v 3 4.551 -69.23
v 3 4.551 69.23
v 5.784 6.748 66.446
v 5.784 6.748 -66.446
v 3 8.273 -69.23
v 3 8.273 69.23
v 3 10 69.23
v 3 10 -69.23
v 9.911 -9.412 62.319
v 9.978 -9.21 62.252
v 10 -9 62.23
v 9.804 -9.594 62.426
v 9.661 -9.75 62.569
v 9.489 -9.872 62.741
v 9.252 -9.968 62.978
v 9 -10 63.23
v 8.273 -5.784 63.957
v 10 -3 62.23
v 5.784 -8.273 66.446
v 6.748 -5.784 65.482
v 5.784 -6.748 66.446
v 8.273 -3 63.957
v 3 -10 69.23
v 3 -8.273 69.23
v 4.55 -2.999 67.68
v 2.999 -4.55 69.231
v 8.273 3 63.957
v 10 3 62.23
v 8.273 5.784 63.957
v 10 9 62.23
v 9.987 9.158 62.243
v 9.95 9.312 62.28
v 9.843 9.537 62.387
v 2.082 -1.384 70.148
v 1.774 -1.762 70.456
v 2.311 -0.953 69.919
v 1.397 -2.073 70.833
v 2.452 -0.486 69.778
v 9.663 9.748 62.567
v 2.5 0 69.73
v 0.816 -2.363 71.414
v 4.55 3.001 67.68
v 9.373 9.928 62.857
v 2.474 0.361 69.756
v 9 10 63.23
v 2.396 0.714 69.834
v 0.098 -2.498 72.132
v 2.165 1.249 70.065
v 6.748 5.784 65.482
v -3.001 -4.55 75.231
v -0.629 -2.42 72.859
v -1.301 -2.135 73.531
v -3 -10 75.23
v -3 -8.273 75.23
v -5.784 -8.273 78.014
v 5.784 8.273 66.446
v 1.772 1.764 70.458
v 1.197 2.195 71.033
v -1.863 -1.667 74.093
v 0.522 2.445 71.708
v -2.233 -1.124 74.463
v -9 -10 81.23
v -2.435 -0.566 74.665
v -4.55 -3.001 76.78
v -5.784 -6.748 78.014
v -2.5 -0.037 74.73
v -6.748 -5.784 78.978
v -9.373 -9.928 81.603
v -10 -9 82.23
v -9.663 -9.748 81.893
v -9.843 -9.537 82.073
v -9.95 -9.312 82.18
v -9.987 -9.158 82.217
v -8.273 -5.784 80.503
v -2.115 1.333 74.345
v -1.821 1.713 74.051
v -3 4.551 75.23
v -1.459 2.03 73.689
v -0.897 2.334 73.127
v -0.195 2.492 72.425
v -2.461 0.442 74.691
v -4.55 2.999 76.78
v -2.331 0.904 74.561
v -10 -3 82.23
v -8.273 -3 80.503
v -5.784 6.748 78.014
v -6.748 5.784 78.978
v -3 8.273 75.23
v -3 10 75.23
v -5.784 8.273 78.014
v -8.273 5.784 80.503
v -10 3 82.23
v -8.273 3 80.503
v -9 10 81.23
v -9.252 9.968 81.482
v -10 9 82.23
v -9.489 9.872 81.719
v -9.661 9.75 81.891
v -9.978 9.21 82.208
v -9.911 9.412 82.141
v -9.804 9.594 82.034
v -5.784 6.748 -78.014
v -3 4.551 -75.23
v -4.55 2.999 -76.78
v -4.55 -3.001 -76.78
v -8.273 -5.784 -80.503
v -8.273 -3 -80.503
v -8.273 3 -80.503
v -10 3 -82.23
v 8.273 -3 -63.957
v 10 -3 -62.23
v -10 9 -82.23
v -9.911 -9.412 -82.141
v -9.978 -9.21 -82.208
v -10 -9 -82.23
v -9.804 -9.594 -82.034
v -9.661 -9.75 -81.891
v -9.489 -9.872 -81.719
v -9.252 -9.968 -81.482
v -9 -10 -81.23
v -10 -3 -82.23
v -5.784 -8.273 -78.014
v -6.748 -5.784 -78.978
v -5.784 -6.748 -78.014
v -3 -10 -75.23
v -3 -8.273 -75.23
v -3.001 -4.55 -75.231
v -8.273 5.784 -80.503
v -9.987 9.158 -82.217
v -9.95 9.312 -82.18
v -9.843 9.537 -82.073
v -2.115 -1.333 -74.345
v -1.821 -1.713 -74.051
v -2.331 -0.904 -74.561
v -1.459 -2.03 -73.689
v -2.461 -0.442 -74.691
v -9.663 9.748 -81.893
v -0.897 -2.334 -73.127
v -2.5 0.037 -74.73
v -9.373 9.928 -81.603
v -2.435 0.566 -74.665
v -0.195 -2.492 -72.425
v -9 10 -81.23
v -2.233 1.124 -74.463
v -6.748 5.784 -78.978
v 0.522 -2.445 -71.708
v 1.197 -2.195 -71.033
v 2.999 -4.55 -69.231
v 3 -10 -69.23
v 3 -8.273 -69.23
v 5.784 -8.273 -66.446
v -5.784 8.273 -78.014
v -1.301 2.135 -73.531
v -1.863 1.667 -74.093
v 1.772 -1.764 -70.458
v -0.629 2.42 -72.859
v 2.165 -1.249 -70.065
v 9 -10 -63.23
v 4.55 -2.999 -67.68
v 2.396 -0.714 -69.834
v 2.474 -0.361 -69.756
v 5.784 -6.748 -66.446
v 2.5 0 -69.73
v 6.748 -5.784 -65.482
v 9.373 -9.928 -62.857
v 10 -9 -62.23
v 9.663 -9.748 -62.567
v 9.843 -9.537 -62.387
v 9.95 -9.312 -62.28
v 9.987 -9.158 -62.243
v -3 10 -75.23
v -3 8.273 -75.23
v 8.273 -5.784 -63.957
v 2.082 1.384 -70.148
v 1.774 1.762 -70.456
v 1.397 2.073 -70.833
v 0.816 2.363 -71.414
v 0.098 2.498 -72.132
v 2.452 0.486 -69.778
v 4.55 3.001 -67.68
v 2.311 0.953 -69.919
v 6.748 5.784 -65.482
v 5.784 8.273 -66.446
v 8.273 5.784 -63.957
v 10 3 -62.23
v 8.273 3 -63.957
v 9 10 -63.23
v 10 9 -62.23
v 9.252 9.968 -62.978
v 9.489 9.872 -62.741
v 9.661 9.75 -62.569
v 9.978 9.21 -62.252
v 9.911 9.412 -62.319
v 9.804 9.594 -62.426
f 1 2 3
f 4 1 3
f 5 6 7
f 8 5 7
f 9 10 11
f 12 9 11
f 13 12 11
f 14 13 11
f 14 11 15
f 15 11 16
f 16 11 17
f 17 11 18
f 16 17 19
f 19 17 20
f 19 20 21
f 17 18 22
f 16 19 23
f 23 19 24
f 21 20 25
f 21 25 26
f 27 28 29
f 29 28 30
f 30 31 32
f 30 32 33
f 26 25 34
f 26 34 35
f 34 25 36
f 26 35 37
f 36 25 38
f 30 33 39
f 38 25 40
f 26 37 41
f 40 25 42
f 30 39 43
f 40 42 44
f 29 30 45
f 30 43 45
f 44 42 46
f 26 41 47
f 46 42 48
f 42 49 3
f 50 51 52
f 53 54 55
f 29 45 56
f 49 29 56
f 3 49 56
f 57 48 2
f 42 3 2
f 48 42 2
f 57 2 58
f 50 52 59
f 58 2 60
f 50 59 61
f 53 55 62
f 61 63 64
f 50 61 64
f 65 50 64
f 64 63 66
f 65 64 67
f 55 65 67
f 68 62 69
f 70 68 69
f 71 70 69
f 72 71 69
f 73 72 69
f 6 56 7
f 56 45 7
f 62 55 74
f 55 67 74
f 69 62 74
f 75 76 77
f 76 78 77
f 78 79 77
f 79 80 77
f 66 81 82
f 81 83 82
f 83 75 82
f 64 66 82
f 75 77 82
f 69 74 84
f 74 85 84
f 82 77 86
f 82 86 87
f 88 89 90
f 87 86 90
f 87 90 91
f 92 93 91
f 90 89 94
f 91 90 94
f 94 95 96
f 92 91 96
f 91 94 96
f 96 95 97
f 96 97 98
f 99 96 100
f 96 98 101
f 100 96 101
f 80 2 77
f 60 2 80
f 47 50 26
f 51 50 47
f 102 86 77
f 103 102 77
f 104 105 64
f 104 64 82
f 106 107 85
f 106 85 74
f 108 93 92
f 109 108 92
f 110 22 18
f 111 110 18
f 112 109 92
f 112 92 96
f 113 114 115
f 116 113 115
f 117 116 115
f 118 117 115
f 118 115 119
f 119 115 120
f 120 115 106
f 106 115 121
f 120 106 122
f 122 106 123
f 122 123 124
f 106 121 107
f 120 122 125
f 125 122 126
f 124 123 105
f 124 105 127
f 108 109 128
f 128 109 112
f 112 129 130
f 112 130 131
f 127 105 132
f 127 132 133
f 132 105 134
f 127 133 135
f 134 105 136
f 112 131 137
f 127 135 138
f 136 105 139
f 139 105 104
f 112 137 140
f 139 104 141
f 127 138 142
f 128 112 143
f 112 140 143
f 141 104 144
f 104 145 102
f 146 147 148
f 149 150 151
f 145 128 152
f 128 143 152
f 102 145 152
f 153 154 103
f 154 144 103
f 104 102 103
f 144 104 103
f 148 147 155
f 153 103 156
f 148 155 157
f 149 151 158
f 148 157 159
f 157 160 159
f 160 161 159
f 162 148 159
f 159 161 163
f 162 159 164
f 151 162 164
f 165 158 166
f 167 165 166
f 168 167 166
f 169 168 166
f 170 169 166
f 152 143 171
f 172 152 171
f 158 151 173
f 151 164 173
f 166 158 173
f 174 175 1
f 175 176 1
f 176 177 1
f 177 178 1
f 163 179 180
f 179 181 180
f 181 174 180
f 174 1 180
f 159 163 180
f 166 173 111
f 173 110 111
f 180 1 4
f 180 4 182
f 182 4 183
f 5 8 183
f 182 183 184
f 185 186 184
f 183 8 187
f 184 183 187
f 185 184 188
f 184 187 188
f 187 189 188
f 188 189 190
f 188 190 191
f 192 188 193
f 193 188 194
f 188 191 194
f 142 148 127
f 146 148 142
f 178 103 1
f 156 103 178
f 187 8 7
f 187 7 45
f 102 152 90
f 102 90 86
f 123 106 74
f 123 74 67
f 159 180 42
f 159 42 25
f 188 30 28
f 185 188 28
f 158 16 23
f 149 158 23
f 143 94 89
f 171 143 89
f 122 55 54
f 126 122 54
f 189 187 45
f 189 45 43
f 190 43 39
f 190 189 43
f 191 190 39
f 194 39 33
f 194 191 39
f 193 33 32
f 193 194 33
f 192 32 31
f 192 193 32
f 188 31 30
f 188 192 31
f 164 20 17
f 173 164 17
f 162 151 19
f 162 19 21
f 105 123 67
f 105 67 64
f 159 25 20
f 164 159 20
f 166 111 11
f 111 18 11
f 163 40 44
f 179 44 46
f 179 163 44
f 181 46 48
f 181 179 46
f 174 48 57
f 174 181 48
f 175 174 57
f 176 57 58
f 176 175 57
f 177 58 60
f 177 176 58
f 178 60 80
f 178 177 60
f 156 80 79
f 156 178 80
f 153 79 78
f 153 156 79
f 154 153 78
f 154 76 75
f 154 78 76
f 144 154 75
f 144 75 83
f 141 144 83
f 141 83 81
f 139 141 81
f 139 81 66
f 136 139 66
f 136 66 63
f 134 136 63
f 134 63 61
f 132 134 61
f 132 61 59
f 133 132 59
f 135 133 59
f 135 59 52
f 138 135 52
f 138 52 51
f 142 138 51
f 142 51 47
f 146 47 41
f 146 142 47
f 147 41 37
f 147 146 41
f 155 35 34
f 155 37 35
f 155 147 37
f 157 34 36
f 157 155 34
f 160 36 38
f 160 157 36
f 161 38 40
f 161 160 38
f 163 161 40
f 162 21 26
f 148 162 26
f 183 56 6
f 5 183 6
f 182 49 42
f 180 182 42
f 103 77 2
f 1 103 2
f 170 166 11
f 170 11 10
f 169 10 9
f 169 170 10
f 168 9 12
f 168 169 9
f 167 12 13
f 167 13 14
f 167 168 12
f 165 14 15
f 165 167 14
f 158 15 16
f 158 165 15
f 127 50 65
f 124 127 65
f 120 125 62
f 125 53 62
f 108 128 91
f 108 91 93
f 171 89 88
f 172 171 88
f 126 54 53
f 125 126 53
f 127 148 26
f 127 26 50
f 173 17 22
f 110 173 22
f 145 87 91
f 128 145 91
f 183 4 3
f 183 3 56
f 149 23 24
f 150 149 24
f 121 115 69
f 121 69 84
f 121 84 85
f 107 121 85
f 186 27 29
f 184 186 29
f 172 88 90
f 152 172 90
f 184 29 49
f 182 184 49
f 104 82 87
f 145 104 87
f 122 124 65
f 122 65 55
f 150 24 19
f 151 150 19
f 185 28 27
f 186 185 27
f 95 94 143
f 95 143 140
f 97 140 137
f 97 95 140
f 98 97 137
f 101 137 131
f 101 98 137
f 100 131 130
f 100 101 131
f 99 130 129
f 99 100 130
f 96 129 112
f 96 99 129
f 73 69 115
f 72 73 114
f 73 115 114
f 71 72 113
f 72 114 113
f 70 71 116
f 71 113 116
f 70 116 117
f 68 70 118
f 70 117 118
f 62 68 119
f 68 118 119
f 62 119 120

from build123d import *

# Parameters (mm, degrees)
BOSS_EXTRUDE1_DEPTH     = 82.23
CUT_EXTRUDE1_DEPTH      = 166.066930668
CUT_EXTRUDE1_DEPTH_BACK = 166.066930668
SKETCH2_R               = 2.5
FILLET1_R               = 1
SKETCH3_W               = 42.278905999
SKETCH3_H               = 22
CUT_EXTRUDE2_DEPTH      = 128.405385483
SKETCH4_W               = 35
SKETCH4_H               = 22.104489803
CUT_EXTRUDE3_DEPTH      = 128.405385483


with BuildPart() as part:
    # Sketch1 → Boss-Extrude1 (new, symmetric)
    with BuildSketch(Plane.XY):
        Polygon((-10, 10), (-3, 10), (-3, 8.272610059), (-5.783778863, 8.272610059), (-5.783778863, 6.747994248), (-3, 4.550753814), (3, 4.550753814), (5.783778863, 6.747994248), (5.783778863, 8.272610059), (3, 8.272610059), (3, 10), (10, 10), (10, 3), (8.272610059, 3), (8.272610059, 5.783778863), (6.747994248, 5.783778863), (4.55, 3.000595152), (4.55, -2.999404848), (6.747994248, -5.783778863), (8.272610059, -5.783778863), (8.272610059, -3), (10, -3), (10, -10), (3, -10), (3, -8.272610059), (5.783778863, -8.272610059), (5.783778863, -6.747994248), (2.999404848, -4.55), (-3.000595152, -4.55), (-5.783778863, -6.747994248), (-5.783778863, -8.272610059), (-3, -8.272610059), (-3, -10), (-10, -10), (-10, -3), (-8.272610059, -3), (-8.272610059, -5.783778863), (-6.747994248, -5.783778863), (-4.55, -3.000595152), (-4.55, 2.999404848), (-6.747994248, 5.783778863), (-8.272610059, 5.783778863), (-8.272610059, 3), (-10, 3), align=None)
    extrude(amount=BOSS_EXTRUDE1_DEPTH, both=True)

    # Sketch2 → Cut-Extrude1 (cut, two sides: drawn at the far end of the back side and taken through both)
    with BuildSketch(Plane.XY.offset(82.23).offset(-CUT_EXTRUDE1_DEPTH_BACK)):
        Circle(SKETCH2_R)
    extrude(amount=CUT_EXTRUDE1_DEPTH + CUT_EXTRUDE1_DEPTH_BACK, mode=Mode.SUBTRACT)

    # Fillet1
    fillet1_edges = [part.edges().sort_by_distance(p)[0] for p in [
        (-10, 10, 0),
        (10, 10, 0),
        (10, -10, 0),
        (-10, -10, 0),
    ]]
    fillet(fillet1_edges, radius=FILLET1_R)

    # Sketch3 → Cut-Extrude2 (cut, through all)
    with BuildSketch(Plane(origin=(36.115, 0, -36.115), x_dir=(0.7071067811865477, 0, 0.7071067811865475), z_dir=(-0.7071067811865475, 0, 0.7071067811865477))):
        with Locations((-49.240441639, 0.067646977)):
            Rectangle(SKETCH3_W, SKETCH3_H)
    extrude(amount=-CUT_EXTRUDE2_DEPTH, mode=Mode.SUBTRACT)

    # Sketch4 → Cut-Extrude3 (cut, through all)
    with BuildSketch(Plane(origin=(36.115, 0, 36.115), x_dir=(-0.7071067811865477, 0, 0.7071067811865475), z_dir=(-0.7071067811865475, 0, -0.7071067811865477))):
        with Locations((52.605568003, 0.016996688)):
            Rectangle(SKETCH4_W, SKETCH4_H)
    extrude(amount=-CUT_EXTRUDE3_DEPTH, mode=Mode.SUBTRACT)


solid = part.part
